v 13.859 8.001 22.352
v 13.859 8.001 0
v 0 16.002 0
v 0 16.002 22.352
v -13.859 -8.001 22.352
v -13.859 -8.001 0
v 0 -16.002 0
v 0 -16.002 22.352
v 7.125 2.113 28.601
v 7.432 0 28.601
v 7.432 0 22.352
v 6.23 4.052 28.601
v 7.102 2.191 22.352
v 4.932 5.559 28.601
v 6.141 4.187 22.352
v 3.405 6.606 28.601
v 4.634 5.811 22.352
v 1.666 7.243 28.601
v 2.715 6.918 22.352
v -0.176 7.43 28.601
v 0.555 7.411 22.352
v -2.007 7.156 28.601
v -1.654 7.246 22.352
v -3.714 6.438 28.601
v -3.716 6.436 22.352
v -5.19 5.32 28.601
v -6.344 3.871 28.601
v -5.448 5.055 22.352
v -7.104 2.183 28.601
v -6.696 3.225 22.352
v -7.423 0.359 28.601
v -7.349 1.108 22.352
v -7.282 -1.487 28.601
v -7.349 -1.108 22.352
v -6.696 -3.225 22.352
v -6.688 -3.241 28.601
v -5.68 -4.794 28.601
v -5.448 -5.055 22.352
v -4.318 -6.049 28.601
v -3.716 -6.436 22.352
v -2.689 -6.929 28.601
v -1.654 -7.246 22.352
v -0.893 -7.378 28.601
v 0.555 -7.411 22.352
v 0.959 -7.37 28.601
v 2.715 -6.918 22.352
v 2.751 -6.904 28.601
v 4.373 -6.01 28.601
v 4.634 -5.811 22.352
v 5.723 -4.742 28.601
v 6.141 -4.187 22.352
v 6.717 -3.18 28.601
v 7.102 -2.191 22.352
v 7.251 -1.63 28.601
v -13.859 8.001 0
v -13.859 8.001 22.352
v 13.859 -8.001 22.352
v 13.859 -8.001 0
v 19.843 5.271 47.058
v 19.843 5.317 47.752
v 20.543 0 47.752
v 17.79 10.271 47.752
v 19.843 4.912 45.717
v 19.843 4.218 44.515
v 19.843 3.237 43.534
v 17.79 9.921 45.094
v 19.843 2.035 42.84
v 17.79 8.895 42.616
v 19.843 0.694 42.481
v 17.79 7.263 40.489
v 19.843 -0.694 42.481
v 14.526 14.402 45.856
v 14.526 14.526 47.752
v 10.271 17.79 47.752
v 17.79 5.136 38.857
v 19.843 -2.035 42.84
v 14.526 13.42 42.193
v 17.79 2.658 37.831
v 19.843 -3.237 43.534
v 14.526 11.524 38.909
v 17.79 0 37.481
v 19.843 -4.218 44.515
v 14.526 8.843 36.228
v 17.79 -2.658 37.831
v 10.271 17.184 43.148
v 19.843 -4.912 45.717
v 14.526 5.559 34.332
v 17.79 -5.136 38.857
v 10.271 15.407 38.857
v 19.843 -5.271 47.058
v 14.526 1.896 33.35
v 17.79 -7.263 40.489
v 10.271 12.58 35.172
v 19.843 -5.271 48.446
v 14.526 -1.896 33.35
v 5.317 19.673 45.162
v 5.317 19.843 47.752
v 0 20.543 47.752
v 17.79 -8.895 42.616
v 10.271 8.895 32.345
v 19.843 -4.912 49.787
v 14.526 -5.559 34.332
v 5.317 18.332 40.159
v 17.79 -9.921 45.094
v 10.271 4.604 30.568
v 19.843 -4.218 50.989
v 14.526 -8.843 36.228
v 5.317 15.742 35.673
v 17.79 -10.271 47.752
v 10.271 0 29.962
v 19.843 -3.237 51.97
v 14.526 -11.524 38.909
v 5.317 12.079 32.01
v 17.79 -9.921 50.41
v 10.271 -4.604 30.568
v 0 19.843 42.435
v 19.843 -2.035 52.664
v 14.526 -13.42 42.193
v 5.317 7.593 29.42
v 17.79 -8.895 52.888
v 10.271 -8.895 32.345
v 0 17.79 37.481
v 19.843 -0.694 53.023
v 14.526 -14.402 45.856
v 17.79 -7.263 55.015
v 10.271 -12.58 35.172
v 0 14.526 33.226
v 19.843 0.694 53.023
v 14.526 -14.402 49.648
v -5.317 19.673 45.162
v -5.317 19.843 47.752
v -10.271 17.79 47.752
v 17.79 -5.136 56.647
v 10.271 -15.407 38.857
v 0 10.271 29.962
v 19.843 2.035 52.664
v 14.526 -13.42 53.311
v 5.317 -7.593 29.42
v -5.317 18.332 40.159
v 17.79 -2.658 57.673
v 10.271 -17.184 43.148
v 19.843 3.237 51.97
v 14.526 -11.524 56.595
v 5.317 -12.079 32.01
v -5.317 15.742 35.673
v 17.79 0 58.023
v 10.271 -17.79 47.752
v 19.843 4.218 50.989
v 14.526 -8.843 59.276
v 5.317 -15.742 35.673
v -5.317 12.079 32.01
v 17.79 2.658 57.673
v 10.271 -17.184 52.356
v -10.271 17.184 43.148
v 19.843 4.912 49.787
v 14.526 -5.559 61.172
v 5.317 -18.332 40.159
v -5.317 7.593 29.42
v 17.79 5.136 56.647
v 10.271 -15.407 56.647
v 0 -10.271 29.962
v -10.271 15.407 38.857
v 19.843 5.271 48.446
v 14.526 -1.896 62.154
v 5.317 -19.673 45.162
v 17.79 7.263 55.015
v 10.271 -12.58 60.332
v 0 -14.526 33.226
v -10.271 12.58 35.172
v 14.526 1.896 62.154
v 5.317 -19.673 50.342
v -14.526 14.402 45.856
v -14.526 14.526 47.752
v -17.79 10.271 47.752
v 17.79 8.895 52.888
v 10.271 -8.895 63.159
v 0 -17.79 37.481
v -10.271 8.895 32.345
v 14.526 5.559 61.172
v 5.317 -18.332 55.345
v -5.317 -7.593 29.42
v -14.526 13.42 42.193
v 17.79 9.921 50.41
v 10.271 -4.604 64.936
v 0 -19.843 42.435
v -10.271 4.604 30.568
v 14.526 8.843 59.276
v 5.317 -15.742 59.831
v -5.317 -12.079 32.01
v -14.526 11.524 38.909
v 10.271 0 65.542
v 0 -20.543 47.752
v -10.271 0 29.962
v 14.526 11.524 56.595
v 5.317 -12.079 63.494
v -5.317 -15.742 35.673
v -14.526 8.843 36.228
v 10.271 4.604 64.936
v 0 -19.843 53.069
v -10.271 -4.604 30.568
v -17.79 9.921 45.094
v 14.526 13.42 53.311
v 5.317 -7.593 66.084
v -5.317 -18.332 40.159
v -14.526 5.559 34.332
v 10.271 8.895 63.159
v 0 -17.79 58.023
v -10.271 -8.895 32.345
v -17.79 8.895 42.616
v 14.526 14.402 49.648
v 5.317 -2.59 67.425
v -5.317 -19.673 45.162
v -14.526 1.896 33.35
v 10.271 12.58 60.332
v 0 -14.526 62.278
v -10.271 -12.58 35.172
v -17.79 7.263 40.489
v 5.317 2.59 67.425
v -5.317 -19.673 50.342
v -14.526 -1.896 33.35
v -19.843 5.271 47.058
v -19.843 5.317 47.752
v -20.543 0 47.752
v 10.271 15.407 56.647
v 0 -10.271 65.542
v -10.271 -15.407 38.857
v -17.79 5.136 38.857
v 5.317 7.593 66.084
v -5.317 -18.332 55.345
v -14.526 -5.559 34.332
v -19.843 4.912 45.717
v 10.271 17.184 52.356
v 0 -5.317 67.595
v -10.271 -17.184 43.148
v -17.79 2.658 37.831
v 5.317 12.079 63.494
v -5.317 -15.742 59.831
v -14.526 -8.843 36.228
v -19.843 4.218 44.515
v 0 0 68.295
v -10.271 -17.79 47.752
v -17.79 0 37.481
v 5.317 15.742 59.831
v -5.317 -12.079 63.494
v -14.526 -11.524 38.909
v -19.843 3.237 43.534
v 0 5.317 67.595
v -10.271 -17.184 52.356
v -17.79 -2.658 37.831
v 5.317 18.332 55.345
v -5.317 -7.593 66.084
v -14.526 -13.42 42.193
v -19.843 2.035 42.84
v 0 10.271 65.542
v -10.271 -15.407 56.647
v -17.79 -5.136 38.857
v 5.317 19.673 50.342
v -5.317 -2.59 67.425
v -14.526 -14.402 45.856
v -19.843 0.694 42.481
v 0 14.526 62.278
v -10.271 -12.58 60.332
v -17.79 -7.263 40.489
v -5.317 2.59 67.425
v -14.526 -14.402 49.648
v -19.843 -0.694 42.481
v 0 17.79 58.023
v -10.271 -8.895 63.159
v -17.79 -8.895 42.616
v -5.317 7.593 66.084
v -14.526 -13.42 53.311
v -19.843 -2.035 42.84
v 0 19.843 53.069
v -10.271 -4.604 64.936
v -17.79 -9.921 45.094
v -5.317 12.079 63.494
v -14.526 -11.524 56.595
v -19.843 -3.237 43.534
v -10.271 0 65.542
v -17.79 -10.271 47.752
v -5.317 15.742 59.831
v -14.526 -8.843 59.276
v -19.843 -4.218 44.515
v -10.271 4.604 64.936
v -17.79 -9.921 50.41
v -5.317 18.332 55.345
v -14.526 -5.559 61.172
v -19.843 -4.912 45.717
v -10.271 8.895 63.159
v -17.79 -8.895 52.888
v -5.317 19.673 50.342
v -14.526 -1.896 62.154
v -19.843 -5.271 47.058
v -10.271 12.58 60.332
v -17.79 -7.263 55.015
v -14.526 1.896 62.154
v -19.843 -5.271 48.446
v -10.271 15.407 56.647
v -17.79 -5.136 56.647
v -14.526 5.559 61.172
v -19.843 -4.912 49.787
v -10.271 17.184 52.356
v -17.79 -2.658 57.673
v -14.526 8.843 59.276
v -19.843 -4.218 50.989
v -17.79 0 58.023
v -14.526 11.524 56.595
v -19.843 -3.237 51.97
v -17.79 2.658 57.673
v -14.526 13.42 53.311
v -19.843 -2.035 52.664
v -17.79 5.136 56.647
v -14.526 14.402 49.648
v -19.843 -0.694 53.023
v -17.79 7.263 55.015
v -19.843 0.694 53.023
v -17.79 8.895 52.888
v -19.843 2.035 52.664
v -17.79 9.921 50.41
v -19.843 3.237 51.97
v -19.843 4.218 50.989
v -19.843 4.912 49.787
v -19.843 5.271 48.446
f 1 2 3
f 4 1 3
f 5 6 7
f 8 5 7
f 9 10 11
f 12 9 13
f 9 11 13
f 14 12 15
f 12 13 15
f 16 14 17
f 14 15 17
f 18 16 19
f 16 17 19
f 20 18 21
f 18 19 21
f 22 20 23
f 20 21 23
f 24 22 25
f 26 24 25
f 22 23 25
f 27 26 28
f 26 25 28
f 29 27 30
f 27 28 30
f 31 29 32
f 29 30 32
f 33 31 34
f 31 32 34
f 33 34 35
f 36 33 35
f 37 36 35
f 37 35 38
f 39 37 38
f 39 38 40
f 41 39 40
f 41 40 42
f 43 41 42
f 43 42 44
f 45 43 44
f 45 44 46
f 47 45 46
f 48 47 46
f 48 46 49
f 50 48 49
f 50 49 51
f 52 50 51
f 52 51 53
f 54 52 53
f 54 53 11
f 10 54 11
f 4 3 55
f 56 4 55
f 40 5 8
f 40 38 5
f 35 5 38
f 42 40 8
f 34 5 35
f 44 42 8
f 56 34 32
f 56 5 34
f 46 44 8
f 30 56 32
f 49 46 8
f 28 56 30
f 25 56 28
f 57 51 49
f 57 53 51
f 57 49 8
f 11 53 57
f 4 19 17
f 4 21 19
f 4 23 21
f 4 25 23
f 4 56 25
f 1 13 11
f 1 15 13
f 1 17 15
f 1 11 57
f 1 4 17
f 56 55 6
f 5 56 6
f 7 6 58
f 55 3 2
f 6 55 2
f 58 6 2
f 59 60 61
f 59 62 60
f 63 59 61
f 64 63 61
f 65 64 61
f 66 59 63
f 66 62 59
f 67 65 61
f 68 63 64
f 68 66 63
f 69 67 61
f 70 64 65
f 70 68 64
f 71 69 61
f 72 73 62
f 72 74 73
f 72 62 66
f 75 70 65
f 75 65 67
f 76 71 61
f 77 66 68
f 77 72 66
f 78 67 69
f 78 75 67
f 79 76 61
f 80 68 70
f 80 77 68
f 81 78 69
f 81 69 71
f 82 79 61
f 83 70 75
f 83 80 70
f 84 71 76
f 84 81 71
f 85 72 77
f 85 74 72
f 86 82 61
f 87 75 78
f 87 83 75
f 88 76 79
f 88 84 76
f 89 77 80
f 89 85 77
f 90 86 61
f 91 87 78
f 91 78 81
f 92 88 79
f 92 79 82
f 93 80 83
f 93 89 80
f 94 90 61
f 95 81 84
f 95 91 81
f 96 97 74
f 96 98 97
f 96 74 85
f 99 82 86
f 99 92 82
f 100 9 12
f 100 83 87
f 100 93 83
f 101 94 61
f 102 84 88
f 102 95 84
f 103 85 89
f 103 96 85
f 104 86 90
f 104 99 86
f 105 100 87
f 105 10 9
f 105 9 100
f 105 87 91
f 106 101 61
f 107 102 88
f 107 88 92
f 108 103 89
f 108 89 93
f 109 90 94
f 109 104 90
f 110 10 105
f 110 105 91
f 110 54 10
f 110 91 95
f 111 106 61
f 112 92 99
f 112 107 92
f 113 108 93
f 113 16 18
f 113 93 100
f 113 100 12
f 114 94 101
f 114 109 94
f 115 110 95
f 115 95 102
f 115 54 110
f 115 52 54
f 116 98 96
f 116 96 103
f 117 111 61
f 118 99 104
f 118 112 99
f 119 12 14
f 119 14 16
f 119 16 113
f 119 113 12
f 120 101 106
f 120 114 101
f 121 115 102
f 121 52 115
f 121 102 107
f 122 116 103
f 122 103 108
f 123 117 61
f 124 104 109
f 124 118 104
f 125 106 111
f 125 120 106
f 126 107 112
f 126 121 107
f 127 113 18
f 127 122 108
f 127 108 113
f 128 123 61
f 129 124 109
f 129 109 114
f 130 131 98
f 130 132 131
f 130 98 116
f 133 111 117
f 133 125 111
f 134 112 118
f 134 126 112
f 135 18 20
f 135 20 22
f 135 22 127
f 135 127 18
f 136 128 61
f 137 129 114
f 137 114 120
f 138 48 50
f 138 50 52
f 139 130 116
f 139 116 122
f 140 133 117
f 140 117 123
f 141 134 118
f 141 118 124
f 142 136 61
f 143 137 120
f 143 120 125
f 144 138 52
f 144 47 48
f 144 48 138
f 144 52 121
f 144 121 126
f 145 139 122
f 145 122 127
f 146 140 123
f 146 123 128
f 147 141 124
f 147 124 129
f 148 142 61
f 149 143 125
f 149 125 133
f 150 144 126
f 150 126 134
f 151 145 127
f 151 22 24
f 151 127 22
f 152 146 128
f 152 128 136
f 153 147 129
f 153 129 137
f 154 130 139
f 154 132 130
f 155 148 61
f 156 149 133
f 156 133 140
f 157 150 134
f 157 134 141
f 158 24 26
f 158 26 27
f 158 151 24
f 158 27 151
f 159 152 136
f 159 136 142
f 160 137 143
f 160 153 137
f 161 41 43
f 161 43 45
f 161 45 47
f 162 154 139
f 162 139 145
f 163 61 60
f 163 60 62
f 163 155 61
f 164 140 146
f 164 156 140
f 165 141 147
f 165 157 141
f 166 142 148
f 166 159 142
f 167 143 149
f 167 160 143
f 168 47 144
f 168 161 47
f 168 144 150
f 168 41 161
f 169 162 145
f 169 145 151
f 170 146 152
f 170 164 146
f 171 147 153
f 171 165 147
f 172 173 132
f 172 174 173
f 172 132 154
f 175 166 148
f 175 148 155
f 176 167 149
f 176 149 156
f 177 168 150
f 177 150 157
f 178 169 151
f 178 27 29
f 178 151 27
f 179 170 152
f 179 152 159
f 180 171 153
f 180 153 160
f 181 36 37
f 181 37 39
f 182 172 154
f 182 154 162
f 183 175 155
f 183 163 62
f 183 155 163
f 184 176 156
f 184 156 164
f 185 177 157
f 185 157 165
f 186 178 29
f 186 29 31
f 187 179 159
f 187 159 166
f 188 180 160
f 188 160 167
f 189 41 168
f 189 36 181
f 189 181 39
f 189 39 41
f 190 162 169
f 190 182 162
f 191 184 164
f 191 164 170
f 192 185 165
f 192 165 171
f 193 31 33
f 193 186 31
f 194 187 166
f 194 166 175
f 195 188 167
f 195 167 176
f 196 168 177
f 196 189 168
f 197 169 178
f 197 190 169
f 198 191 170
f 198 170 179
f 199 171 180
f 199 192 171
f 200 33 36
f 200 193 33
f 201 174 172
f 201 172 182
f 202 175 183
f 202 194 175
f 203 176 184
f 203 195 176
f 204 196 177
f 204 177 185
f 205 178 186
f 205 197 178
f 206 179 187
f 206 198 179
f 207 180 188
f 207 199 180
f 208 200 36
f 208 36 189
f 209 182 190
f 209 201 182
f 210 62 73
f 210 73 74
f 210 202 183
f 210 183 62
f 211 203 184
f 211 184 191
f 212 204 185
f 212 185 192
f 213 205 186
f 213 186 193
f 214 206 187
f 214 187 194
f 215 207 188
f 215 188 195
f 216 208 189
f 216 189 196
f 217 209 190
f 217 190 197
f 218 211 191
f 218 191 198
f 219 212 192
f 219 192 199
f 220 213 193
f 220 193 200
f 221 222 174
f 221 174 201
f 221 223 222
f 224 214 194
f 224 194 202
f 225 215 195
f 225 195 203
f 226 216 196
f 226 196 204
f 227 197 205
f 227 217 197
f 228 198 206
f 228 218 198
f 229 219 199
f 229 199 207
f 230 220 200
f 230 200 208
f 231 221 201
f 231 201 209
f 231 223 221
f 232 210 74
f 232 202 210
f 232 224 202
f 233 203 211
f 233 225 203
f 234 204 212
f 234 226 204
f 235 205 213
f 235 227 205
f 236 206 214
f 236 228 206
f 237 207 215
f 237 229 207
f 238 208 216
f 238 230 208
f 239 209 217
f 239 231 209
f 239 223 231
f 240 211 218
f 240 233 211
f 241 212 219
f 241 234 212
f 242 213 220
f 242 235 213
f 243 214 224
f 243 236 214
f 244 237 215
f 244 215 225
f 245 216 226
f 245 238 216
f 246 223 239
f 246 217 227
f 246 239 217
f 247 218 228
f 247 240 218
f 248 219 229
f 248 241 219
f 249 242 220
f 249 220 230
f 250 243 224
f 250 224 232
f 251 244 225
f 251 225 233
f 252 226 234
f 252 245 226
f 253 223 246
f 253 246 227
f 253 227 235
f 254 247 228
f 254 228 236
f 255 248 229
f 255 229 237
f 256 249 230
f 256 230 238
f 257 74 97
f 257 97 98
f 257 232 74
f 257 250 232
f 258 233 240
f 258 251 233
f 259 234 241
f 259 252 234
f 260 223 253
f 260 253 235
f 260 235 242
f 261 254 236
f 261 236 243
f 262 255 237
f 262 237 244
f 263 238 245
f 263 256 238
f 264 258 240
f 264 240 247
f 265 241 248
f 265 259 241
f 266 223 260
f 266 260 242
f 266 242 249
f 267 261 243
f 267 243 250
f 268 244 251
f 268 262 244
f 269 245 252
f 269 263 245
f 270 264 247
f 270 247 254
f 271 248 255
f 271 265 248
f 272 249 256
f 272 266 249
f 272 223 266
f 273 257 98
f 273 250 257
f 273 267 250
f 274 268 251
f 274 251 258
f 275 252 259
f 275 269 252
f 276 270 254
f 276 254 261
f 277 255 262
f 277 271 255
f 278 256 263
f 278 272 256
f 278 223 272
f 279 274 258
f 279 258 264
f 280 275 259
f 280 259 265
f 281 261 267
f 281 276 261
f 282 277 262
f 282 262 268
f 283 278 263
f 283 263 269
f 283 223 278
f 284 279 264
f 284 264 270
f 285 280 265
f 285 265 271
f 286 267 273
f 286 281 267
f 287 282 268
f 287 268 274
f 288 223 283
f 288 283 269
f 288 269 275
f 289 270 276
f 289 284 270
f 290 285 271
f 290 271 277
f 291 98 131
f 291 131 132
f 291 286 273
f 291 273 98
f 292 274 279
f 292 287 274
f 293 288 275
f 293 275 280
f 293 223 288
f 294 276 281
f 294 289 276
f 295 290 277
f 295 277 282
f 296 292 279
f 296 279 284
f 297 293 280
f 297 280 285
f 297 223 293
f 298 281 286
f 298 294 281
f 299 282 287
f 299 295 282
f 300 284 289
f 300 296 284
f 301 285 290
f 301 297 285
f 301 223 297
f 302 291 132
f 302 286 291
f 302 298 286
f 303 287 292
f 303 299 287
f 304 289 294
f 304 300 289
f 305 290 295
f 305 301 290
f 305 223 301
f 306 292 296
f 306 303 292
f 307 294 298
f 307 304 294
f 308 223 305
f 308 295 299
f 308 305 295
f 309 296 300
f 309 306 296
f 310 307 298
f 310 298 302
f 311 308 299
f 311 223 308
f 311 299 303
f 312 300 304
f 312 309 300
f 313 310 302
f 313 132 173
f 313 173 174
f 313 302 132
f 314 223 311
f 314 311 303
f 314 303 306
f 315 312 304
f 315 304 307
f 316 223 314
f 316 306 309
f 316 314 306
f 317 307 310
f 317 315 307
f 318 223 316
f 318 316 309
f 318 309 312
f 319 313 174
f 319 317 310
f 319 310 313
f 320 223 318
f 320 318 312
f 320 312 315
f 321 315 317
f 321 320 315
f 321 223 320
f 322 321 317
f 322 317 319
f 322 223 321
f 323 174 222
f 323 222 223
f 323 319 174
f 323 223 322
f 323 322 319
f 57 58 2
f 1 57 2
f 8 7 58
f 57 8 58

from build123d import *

# Parameters (mm, degrees)
F1_DEPTH = 22.352
F2_R     = 7.432134
F3_DEPTH = 25.4


with BuildPart() as f1:
    # F0 (on Top) → F1 (new body)
    with BuildSketch(Plane.XY):
        Polygon((13.858515, -8.001217), (13.858515, 8.001217), (0, 16.002435), (-13.858515, 8.001217), (-13.858515, -8.001217), (0, -16.002435), align=None)
    extrude(amount=F1_DEPTH)

    # F2 (on face) → F3 (join)
    with BuildSketch(Plane.XY.offset(22.352)):
        Circle(F2_R)
    extrude(amount=F3_DEPTH)

    # F4 (on face) → F5 (revolve)
    with BuildSketch(Plane.XY.offset(47.752)):
        with BuildLine():
            Line((7.432134, 0), (20.542542, 0))
            ThreePointArc((20.542542, 0), (0, 20.542542), (-20.542542, 0))
            Line((-20.542542, 0), (-7.432134, 0))
            ThreePointArc((-7.432134, 0), (0, 7.432134), (7.432134, 0))
        make_face()
        with BuildLine():
            Line((-7.432134, 0), (7.432134, 0))
            ThreePointArc((7.432134, 0), (0, 7.432134), (-7.432134, 0))
        make_face()
    revolve(axis=Axis((0, 0, 47.752), (-1, 0, 0)))


solid = f1.part
